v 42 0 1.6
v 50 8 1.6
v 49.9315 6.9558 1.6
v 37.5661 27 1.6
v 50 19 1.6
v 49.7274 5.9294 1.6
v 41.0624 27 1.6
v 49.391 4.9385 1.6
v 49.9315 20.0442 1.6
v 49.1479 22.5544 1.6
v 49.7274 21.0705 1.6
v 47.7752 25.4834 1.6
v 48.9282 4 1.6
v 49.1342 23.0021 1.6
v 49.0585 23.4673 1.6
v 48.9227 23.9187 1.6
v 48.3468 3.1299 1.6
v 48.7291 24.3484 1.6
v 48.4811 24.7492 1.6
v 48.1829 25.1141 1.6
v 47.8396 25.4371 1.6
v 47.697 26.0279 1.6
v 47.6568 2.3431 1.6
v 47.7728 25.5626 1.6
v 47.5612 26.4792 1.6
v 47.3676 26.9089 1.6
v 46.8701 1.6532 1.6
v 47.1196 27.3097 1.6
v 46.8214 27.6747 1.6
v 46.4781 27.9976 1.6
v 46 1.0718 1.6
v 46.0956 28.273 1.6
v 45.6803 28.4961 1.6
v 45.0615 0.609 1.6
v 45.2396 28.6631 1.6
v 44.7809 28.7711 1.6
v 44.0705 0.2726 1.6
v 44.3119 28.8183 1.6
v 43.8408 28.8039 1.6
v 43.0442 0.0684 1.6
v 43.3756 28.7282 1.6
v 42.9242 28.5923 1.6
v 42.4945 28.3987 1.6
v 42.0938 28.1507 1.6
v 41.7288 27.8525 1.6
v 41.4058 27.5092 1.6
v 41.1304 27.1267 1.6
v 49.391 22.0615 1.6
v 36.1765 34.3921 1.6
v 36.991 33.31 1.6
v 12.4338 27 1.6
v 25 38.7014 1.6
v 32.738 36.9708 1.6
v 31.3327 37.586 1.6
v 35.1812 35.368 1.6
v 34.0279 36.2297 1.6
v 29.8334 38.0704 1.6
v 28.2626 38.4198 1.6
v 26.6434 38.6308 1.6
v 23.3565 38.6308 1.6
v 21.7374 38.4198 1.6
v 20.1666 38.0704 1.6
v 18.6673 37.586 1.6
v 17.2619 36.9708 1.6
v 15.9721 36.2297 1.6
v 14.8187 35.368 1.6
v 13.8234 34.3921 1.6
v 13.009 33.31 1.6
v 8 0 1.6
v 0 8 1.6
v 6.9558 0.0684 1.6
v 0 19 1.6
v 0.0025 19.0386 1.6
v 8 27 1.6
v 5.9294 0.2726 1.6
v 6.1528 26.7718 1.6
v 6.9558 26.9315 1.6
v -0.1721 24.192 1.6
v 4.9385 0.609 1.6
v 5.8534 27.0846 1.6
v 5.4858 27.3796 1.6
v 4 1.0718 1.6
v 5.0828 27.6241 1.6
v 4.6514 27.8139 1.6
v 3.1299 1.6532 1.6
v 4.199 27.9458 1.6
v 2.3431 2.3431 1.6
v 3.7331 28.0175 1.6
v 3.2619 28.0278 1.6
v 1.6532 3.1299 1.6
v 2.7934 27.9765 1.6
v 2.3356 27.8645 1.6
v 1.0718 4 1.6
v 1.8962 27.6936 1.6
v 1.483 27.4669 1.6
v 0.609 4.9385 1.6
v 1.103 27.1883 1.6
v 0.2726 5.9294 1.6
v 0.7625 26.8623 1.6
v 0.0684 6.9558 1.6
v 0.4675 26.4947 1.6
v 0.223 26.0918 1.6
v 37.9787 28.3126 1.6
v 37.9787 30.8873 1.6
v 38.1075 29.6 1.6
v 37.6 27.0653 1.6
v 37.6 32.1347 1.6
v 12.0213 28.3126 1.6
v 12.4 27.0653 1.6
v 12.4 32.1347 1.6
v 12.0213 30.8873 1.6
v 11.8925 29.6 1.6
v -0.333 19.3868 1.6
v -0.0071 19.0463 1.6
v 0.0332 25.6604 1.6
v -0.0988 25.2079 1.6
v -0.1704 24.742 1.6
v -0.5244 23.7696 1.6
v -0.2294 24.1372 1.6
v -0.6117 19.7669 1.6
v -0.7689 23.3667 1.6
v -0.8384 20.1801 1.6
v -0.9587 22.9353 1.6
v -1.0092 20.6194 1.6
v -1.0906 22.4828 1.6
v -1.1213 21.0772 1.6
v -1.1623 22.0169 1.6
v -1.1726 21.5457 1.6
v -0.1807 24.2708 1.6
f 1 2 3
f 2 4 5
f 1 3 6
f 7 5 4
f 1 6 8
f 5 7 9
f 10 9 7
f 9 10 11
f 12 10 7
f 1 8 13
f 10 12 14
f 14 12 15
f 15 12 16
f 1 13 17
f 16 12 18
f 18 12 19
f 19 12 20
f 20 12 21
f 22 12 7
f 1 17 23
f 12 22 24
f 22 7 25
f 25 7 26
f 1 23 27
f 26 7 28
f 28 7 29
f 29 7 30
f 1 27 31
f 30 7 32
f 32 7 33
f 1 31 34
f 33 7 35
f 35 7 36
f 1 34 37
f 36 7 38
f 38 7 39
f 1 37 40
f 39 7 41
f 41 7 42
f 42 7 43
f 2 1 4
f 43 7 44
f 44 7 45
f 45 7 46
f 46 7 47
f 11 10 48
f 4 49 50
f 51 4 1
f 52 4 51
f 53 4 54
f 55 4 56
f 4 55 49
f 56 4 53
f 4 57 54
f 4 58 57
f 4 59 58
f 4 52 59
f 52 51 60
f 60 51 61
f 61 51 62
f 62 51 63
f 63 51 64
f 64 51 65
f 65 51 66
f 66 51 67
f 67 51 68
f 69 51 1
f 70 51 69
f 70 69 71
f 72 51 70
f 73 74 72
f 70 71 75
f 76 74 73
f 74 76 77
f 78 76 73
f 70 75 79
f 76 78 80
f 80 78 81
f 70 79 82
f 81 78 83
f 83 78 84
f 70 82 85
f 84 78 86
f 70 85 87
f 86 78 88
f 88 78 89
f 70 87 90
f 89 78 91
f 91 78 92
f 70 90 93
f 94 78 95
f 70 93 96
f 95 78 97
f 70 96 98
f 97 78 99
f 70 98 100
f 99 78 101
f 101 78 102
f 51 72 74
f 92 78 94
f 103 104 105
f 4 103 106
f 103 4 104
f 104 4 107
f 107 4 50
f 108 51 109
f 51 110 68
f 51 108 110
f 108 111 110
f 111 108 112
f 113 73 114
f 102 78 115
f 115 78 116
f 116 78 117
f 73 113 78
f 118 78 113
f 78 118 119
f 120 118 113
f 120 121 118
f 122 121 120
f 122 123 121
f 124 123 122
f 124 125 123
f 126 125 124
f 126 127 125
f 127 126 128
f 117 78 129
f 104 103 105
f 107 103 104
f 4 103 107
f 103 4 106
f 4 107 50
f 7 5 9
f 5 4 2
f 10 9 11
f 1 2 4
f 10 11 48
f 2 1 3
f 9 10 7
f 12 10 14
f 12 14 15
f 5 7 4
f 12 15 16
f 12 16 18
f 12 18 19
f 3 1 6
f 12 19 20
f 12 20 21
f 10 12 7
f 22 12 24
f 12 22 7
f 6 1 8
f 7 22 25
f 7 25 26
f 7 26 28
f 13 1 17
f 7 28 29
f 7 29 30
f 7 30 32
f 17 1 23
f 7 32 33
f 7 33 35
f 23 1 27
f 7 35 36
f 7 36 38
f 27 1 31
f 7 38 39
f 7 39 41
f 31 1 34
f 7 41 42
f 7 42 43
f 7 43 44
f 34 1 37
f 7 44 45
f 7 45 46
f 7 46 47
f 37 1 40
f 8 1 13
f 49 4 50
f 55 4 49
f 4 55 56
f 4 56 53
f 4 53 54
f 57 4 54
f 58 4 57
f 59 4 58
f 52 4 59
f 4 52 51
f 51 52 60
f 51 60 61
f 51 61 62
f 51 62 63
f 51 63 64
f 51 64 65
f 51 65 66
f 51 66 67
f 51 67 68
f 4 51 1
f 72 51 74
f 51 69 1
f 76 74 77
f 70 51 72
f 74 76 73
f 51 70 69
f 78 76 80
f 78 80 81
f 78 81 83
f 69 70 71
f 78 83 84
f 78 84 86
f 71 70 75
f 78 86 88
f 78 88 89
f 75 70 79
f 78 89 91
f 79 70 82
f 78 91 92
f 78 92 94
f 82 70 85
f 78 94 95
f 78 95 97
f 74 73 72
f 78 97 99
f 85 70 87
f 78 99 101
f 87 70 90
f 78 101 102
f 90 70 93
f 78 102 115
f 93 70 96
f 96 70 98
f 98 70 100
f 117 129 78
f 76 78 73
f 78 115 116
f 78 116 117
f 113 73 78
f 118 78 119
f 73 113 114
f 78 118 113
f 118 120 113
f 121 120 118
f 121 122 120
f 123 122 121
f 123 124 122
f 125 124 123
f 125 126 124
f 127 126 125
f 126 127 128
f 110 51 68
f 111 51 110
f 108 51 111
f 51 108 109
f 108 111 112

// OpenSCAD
// Overlap test for the 4-colour skull keyring: each pair of colour parts must share (almost) zero volume.
include <keyring_skull_4color.scad>;
part = "none"; A = "gray"; B = "black";
module p(n) { if (n == "gray") gray_part(); else if (n == "black") black_part(); else if (n == "white") white_part(); else if (n == "blue") blue_part(); }
intersection() { p(A); p(B); }
